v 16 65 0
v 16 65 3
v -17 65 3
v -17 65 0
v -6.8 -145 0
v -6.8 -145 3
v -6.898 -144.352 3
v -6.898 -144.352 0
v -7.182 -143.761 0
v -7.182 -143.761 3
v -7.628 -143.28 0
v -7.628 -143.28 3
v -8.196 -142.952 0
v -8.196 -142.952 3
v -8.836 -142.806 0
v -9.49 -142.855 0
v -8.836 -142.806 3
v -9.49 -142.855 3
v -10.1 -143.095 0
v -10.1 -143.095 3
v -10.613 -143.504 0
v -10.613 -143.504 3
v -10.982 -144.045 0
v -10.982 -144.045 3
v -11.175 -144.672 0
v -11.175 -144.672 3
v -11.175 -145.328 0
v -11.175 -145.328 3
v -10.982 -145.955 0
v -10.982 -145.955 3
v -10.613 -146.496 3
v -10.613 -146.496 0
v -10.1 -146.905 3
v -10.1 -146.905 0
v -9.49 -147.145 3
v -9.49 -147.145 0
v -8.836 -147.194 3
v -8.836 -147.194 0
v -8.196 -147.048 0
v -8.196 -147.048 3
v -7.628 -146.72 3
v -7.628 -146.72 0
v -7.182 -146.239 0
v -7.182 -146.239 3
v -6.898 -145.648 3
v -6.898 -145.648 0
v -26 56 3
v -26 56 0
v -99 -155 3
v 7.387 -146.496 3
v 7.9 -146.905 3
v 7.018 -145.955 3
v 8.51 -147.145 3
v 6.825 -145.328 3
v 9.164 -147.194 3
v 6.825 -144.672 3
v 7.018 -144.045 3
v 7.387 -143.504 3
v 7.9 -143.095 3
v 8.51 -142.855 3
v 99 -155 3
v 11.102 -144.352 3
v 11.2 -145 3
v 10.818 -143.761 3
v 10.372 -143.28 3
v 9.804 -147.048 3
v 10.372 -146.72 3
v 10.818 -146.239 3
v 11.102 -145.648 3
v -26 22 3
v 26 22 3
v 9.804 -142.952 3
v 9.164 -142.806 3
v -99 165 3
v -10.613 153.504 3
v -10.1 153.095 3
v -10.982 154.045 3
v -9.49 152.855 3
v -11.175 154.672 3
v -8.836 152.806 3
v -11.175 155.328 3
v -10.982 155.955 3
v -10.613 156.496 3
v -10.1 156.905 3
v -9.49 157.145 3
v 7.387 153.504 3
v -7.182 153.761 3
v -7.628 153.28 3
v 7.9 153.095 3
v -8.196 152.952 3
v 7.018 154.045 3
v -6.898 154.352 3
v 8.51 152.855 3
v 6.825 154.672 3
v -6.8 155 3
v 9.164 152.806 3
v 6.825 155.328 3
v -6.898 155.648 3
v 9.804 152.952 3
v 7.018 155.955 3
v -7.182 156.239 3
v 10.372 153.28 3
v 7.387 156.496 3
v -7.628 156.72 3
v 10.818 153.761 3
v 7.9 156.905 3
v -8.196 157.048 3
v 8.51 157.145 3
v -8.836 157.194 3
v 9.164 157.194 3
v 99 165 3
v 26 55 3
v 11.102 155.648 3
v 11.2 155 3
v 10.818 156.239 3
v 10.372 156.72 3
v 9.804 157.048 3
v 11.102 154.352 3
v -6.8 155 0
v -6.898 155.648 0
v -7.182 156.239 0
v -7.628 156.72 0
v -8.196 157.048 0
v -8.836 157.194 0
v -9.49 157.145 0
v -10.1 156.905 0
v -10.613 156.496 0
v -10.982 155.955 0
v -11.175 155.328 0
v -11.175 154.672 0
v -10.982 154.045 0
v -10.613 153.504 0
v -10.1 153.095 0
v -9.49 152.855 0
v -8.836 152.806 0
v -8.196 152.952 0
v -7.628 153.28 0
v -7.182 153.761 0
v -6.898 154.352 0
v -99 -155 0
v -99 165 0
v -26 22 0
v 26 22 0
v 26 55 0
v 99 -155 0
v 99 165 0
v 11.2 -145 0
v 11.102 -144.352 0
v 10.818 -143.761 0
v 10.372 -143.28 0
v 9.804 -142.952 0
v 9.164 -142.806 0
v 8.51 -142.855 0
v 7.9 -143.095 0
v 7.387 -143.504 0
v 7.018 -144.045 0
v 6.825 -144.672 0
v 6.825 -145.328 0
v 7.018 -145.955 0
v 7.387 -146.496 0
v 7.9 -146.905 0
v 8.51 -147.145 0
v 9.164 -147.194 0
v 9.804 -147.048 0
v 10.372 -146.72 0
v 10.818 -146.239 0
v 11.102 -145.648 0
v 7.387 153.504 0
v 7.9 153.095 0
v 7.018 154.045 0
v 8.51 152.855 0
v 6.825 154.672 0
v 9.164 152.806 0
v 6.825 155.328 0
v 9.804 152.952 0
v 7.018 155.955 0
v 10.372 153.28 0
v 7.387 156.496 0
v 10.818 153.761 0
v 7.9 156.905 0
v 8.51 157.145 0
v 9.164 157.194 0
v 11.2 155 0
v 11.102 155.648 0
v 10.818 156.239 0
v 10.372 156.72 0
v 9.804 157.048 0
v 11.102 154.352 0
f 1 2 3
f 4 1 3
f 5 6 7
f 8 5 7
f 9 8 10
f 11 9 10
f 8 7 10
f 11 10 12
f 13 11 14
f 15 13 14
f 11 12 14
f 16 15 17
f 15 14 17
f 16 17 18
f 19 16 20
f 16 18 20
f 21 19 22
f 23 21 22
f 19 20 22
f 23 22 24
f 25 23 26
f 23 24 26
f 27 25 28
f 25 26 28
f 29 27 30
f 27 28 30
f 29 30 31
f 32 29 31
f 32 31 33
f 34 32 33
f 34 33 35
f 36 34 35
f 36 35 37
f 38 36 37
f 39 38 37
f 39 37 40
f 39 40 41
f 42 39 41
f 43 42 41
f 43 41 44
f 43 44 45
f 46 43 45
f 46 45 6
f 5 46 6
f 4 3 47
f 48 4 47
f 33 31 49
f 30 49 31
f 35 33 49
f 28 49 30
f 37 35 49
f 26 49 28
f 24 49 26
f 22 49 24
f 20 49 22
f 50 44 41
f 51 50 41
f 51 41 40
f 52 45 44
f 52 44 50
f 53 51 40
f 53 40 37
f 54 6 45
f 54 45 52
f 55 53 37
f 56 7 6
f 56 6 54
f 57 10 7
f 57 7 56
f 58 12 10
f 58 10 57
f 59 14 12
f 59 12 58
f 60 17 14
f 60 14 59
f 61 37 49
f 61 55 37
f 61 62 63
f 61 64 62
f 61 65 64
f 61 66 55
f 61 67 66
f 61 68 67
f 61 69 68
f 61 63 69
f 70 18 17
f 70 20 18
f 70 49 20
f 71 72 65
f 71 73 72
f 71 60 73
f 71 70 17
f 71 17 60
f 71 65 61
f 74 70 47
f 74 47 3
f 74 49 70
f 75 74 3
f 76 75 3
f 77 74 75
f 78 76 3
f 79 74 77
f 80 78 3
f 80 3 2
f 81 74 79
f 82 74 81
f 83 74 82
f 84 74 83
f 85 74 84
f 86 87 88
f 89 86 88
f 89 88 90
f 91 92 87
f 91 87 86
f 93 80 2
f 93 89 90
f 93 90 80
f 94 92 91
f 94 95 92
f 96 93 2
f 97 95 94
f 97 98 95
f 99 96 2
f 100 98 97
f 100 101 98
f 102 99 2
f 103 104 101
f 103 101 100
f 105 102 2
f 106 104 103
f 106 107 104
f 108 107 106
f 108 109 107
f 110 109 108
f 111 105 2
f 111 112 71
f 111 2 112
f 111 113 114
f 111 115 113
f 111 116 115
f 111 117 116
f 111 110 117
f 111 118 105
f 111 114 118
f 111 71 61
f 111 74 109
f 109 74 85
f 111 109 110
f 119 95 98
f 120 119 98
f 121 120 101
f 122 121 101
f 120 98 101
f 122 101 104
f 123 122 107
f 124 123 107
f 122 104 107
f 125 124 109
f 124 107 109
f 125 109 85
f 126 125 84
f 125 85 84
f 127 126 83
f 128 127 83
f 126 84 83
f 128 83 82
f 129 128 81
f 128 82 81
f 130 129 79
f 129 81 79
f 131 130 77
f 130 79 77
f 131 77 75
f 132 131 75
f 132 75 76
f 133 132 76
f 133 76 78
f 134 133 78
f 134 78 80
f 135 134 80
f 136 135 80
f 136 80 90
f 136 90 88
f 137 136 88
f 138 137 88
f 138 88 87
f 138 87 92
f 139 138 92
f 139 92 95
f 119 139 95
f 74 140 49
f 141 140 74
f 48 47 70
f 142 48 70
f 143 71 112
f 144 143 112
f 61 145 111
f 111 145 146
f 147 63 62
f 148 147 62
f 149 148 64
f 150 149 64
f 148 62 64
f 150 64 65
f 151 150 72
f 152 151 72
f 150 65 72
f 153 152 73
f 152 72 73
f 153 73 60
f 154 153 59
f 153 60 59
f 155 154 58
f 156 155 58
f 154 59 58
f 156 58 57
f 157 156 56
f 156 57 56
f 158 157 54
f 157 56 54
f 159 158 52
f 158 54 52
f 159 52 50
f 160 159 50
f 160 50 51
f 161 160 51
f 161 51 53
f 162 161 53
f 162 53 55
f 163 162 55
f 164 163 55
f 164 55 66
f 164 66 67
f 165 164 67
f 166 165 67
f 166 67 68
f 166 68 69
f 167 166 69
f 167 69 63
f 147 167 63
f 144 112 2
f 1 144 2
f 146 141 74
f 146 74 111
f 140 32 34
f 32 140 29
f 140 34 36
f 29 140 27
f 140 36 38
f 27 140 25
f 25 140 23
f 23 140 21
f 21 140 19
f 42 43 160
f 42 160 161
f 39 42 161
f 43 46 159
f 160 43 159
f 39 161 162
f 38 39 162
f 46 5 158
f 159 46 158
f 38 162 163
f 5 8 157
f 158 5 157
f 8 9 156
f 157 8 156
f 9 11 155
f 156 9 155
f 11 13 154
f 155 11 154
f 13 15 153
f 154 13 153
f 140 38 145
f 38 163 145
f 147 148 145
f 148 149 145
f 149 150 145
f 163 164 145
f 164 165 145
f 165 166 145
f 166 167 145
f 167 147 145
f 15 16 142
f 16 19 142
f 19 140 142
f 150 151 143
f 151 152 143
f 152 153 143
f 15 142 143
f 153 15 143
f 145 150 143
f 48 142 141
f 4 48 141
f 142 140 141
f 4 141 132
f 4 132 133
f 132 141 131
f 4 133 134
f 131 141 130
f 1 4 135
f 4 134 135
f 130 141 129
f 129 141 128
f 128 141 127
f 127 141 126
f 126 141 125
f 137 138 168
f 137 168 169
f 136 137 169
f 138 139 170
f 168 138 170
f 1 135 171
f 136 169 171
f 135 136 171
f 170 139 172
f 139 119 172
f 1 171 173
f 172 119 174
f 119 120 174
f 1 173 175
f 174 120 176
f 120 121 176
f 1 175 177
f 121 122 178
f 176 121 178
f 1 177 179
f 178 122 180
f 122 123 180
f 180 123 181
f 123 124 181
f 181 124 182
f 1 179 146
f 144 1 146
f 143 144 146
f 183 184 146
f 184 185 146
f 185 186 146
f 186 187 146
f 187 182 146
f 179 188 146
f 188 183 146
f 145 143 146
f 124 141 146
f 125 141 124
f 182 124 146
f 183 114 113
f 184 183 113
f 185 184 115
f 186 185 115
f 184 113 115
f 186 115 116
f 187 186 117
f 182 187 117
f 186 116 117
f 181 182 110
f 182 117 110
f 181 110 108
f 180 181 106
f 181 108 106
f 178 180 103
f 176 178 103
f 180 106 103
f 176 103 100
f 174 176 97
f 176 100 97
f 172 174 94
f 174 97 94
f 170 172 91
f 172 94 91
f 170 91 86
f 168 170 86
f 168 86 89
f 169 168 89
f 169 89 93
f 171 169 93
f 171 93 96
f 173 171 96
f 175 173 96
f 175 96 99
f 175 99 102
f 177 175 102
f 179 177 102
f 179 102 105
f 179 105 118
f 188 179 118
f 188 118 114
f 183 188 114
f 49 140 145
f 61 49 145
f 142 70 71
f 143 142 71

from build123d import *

# Parameters (mm, degrees)
ESQUISSE1_W             = 198
ESQUISSE1_H             = 320
BOSS_EXTRU_1_DEPTH      = 3
ENL_V_MAT_EXTRU_1_REACH = 194.445
ESQUISSE2_R             = 2.2
ENL_V_MAT_EXTRU_3_REACH = 194.445


with BuildPart() as part:
    # Esquisse1 → Boss.-Extru.1 (new body)
    with BuildSketch(Plane.XY):
        with Locations((0, 5)):
            Rectangle(ESQUISSE1_W, ESQUISSE1_H)
    extrude(amount=BOSS_EXTRU_1_DEPTH)

    # Esquisse2 → Enlèv. mat.-Extru.1 (cut, up to next)
    with BuildSketch(Plane.XY.offset(3), mode=Mode.PRIVATE) as enl_v_mat_extru_1_sk1:
        with Locations((9, -145)):
            Circle(ESQUISSE2_R)
    enl_v_mat_extru_1_tool1 = extrude(enl_v_mat_extru_1_sk1.sketch, amount=-ENL_V_MAT_EXTRU_1_REACH, mode=Mode.PRIVATE) & part.part
    # Esquisse2 → Enlèv. mat.-Extru.1 (cut, up to next)
    with BuildSketch(Plane.XY.offset(3), mode=Mode.PRIVATE) as enl_v_mat_extru_1_sk2:
        with Locations((-9, -145)):
            Circle(ESQUISSE2_R)
    enl_v_mat_extru_1_tool2 = extrude(enl_v_mat_extru_1_sk2.sketch, amount=-ENL_V_MAT_EXTRU_1_REACH, mode=Mode.PRIVATE) & part.part
    # Esquisse2 → Enlèv. mat.-Extru.1 (cut, up to next)
    with BuildSketch(Plane.XY.offset(3), mode=Mode.PRIVATE) as enl_v_mat_extru_1_sk3:
        with Locations((-9, 155)):
            Circle(ESQUISSE2_R)
    enl_v_mat_extru_1_tool3 = extrude(enl_v_mat_extru_1_sk3.sketch, amount=-ENL_V_MAT_EXTRU_1_REACH, mode=Mode.PRIVATE) & part.part
    # Esquisse2 → Enlèv. mat.-Extru.1 (cut, up to next)
    with BuildSketch(Plane.XY.offset(3), mode=Mode.PRIVATE) as enl_v_mat_extru_1_sk4:
        with Locations((9, 155)):
            Circle(ESQUISSE2_R)
    enl_v_mat_extru_1_tool4 = extrude(enl_v_mat_extru_1_sk4.sketch, amount=-ENL_V_MAT_EXTRU_1_REACH, mode=Mode.PRIVATE) & part.part
    add(enl_v_mat_extru_1_tool1.solids().sort_by_distance((9, -145, 3))[0], mode=Mode.SUBTRACT)
    add(enl_v_mat_extru_1_tool2.solids().sort_by_distance((-9, -145, 3))[0], mode=Mode.SUBTRACT)
    add(enl_v_mat_extru_1_tool3.solids().sort_by_distance((-9, 155, 3))[0], mode=Mode.SUBTRACT)
    add(enl_v_mat_extru_1_tool4.solids().sort_by_distance((9, 155, 3))[0], mode=Mode.SUBTRACT)

    # Esquisse5 → Enlèv. mat.-Extru.3 (cut, up to next)
    with BuildSketch(Plane.XY.offset(3), mode=Mode.PRIVATE) as enl_v_mat_extru_3_sk1:
        Polygon((0, 22), (26, 22), (26, 55), (16, 65), (-17, 65), (-26, 56), (-26, 22), align=None)
    enl_v_mat_extru_3_tool1 = extrude(enl_v_mat_extru_3_sk1.sketch, amount=-ENL_V_MAT_EXTRU_3_REACH, mode=Mode.PRIVATE) & part.part
    add(enl_v_mat_extru_3_tool1.solids().sort_by_distance((-0.094073, 42.727414, 3))[0], mode=Mode.SUBTRACT)


solid = part.part
